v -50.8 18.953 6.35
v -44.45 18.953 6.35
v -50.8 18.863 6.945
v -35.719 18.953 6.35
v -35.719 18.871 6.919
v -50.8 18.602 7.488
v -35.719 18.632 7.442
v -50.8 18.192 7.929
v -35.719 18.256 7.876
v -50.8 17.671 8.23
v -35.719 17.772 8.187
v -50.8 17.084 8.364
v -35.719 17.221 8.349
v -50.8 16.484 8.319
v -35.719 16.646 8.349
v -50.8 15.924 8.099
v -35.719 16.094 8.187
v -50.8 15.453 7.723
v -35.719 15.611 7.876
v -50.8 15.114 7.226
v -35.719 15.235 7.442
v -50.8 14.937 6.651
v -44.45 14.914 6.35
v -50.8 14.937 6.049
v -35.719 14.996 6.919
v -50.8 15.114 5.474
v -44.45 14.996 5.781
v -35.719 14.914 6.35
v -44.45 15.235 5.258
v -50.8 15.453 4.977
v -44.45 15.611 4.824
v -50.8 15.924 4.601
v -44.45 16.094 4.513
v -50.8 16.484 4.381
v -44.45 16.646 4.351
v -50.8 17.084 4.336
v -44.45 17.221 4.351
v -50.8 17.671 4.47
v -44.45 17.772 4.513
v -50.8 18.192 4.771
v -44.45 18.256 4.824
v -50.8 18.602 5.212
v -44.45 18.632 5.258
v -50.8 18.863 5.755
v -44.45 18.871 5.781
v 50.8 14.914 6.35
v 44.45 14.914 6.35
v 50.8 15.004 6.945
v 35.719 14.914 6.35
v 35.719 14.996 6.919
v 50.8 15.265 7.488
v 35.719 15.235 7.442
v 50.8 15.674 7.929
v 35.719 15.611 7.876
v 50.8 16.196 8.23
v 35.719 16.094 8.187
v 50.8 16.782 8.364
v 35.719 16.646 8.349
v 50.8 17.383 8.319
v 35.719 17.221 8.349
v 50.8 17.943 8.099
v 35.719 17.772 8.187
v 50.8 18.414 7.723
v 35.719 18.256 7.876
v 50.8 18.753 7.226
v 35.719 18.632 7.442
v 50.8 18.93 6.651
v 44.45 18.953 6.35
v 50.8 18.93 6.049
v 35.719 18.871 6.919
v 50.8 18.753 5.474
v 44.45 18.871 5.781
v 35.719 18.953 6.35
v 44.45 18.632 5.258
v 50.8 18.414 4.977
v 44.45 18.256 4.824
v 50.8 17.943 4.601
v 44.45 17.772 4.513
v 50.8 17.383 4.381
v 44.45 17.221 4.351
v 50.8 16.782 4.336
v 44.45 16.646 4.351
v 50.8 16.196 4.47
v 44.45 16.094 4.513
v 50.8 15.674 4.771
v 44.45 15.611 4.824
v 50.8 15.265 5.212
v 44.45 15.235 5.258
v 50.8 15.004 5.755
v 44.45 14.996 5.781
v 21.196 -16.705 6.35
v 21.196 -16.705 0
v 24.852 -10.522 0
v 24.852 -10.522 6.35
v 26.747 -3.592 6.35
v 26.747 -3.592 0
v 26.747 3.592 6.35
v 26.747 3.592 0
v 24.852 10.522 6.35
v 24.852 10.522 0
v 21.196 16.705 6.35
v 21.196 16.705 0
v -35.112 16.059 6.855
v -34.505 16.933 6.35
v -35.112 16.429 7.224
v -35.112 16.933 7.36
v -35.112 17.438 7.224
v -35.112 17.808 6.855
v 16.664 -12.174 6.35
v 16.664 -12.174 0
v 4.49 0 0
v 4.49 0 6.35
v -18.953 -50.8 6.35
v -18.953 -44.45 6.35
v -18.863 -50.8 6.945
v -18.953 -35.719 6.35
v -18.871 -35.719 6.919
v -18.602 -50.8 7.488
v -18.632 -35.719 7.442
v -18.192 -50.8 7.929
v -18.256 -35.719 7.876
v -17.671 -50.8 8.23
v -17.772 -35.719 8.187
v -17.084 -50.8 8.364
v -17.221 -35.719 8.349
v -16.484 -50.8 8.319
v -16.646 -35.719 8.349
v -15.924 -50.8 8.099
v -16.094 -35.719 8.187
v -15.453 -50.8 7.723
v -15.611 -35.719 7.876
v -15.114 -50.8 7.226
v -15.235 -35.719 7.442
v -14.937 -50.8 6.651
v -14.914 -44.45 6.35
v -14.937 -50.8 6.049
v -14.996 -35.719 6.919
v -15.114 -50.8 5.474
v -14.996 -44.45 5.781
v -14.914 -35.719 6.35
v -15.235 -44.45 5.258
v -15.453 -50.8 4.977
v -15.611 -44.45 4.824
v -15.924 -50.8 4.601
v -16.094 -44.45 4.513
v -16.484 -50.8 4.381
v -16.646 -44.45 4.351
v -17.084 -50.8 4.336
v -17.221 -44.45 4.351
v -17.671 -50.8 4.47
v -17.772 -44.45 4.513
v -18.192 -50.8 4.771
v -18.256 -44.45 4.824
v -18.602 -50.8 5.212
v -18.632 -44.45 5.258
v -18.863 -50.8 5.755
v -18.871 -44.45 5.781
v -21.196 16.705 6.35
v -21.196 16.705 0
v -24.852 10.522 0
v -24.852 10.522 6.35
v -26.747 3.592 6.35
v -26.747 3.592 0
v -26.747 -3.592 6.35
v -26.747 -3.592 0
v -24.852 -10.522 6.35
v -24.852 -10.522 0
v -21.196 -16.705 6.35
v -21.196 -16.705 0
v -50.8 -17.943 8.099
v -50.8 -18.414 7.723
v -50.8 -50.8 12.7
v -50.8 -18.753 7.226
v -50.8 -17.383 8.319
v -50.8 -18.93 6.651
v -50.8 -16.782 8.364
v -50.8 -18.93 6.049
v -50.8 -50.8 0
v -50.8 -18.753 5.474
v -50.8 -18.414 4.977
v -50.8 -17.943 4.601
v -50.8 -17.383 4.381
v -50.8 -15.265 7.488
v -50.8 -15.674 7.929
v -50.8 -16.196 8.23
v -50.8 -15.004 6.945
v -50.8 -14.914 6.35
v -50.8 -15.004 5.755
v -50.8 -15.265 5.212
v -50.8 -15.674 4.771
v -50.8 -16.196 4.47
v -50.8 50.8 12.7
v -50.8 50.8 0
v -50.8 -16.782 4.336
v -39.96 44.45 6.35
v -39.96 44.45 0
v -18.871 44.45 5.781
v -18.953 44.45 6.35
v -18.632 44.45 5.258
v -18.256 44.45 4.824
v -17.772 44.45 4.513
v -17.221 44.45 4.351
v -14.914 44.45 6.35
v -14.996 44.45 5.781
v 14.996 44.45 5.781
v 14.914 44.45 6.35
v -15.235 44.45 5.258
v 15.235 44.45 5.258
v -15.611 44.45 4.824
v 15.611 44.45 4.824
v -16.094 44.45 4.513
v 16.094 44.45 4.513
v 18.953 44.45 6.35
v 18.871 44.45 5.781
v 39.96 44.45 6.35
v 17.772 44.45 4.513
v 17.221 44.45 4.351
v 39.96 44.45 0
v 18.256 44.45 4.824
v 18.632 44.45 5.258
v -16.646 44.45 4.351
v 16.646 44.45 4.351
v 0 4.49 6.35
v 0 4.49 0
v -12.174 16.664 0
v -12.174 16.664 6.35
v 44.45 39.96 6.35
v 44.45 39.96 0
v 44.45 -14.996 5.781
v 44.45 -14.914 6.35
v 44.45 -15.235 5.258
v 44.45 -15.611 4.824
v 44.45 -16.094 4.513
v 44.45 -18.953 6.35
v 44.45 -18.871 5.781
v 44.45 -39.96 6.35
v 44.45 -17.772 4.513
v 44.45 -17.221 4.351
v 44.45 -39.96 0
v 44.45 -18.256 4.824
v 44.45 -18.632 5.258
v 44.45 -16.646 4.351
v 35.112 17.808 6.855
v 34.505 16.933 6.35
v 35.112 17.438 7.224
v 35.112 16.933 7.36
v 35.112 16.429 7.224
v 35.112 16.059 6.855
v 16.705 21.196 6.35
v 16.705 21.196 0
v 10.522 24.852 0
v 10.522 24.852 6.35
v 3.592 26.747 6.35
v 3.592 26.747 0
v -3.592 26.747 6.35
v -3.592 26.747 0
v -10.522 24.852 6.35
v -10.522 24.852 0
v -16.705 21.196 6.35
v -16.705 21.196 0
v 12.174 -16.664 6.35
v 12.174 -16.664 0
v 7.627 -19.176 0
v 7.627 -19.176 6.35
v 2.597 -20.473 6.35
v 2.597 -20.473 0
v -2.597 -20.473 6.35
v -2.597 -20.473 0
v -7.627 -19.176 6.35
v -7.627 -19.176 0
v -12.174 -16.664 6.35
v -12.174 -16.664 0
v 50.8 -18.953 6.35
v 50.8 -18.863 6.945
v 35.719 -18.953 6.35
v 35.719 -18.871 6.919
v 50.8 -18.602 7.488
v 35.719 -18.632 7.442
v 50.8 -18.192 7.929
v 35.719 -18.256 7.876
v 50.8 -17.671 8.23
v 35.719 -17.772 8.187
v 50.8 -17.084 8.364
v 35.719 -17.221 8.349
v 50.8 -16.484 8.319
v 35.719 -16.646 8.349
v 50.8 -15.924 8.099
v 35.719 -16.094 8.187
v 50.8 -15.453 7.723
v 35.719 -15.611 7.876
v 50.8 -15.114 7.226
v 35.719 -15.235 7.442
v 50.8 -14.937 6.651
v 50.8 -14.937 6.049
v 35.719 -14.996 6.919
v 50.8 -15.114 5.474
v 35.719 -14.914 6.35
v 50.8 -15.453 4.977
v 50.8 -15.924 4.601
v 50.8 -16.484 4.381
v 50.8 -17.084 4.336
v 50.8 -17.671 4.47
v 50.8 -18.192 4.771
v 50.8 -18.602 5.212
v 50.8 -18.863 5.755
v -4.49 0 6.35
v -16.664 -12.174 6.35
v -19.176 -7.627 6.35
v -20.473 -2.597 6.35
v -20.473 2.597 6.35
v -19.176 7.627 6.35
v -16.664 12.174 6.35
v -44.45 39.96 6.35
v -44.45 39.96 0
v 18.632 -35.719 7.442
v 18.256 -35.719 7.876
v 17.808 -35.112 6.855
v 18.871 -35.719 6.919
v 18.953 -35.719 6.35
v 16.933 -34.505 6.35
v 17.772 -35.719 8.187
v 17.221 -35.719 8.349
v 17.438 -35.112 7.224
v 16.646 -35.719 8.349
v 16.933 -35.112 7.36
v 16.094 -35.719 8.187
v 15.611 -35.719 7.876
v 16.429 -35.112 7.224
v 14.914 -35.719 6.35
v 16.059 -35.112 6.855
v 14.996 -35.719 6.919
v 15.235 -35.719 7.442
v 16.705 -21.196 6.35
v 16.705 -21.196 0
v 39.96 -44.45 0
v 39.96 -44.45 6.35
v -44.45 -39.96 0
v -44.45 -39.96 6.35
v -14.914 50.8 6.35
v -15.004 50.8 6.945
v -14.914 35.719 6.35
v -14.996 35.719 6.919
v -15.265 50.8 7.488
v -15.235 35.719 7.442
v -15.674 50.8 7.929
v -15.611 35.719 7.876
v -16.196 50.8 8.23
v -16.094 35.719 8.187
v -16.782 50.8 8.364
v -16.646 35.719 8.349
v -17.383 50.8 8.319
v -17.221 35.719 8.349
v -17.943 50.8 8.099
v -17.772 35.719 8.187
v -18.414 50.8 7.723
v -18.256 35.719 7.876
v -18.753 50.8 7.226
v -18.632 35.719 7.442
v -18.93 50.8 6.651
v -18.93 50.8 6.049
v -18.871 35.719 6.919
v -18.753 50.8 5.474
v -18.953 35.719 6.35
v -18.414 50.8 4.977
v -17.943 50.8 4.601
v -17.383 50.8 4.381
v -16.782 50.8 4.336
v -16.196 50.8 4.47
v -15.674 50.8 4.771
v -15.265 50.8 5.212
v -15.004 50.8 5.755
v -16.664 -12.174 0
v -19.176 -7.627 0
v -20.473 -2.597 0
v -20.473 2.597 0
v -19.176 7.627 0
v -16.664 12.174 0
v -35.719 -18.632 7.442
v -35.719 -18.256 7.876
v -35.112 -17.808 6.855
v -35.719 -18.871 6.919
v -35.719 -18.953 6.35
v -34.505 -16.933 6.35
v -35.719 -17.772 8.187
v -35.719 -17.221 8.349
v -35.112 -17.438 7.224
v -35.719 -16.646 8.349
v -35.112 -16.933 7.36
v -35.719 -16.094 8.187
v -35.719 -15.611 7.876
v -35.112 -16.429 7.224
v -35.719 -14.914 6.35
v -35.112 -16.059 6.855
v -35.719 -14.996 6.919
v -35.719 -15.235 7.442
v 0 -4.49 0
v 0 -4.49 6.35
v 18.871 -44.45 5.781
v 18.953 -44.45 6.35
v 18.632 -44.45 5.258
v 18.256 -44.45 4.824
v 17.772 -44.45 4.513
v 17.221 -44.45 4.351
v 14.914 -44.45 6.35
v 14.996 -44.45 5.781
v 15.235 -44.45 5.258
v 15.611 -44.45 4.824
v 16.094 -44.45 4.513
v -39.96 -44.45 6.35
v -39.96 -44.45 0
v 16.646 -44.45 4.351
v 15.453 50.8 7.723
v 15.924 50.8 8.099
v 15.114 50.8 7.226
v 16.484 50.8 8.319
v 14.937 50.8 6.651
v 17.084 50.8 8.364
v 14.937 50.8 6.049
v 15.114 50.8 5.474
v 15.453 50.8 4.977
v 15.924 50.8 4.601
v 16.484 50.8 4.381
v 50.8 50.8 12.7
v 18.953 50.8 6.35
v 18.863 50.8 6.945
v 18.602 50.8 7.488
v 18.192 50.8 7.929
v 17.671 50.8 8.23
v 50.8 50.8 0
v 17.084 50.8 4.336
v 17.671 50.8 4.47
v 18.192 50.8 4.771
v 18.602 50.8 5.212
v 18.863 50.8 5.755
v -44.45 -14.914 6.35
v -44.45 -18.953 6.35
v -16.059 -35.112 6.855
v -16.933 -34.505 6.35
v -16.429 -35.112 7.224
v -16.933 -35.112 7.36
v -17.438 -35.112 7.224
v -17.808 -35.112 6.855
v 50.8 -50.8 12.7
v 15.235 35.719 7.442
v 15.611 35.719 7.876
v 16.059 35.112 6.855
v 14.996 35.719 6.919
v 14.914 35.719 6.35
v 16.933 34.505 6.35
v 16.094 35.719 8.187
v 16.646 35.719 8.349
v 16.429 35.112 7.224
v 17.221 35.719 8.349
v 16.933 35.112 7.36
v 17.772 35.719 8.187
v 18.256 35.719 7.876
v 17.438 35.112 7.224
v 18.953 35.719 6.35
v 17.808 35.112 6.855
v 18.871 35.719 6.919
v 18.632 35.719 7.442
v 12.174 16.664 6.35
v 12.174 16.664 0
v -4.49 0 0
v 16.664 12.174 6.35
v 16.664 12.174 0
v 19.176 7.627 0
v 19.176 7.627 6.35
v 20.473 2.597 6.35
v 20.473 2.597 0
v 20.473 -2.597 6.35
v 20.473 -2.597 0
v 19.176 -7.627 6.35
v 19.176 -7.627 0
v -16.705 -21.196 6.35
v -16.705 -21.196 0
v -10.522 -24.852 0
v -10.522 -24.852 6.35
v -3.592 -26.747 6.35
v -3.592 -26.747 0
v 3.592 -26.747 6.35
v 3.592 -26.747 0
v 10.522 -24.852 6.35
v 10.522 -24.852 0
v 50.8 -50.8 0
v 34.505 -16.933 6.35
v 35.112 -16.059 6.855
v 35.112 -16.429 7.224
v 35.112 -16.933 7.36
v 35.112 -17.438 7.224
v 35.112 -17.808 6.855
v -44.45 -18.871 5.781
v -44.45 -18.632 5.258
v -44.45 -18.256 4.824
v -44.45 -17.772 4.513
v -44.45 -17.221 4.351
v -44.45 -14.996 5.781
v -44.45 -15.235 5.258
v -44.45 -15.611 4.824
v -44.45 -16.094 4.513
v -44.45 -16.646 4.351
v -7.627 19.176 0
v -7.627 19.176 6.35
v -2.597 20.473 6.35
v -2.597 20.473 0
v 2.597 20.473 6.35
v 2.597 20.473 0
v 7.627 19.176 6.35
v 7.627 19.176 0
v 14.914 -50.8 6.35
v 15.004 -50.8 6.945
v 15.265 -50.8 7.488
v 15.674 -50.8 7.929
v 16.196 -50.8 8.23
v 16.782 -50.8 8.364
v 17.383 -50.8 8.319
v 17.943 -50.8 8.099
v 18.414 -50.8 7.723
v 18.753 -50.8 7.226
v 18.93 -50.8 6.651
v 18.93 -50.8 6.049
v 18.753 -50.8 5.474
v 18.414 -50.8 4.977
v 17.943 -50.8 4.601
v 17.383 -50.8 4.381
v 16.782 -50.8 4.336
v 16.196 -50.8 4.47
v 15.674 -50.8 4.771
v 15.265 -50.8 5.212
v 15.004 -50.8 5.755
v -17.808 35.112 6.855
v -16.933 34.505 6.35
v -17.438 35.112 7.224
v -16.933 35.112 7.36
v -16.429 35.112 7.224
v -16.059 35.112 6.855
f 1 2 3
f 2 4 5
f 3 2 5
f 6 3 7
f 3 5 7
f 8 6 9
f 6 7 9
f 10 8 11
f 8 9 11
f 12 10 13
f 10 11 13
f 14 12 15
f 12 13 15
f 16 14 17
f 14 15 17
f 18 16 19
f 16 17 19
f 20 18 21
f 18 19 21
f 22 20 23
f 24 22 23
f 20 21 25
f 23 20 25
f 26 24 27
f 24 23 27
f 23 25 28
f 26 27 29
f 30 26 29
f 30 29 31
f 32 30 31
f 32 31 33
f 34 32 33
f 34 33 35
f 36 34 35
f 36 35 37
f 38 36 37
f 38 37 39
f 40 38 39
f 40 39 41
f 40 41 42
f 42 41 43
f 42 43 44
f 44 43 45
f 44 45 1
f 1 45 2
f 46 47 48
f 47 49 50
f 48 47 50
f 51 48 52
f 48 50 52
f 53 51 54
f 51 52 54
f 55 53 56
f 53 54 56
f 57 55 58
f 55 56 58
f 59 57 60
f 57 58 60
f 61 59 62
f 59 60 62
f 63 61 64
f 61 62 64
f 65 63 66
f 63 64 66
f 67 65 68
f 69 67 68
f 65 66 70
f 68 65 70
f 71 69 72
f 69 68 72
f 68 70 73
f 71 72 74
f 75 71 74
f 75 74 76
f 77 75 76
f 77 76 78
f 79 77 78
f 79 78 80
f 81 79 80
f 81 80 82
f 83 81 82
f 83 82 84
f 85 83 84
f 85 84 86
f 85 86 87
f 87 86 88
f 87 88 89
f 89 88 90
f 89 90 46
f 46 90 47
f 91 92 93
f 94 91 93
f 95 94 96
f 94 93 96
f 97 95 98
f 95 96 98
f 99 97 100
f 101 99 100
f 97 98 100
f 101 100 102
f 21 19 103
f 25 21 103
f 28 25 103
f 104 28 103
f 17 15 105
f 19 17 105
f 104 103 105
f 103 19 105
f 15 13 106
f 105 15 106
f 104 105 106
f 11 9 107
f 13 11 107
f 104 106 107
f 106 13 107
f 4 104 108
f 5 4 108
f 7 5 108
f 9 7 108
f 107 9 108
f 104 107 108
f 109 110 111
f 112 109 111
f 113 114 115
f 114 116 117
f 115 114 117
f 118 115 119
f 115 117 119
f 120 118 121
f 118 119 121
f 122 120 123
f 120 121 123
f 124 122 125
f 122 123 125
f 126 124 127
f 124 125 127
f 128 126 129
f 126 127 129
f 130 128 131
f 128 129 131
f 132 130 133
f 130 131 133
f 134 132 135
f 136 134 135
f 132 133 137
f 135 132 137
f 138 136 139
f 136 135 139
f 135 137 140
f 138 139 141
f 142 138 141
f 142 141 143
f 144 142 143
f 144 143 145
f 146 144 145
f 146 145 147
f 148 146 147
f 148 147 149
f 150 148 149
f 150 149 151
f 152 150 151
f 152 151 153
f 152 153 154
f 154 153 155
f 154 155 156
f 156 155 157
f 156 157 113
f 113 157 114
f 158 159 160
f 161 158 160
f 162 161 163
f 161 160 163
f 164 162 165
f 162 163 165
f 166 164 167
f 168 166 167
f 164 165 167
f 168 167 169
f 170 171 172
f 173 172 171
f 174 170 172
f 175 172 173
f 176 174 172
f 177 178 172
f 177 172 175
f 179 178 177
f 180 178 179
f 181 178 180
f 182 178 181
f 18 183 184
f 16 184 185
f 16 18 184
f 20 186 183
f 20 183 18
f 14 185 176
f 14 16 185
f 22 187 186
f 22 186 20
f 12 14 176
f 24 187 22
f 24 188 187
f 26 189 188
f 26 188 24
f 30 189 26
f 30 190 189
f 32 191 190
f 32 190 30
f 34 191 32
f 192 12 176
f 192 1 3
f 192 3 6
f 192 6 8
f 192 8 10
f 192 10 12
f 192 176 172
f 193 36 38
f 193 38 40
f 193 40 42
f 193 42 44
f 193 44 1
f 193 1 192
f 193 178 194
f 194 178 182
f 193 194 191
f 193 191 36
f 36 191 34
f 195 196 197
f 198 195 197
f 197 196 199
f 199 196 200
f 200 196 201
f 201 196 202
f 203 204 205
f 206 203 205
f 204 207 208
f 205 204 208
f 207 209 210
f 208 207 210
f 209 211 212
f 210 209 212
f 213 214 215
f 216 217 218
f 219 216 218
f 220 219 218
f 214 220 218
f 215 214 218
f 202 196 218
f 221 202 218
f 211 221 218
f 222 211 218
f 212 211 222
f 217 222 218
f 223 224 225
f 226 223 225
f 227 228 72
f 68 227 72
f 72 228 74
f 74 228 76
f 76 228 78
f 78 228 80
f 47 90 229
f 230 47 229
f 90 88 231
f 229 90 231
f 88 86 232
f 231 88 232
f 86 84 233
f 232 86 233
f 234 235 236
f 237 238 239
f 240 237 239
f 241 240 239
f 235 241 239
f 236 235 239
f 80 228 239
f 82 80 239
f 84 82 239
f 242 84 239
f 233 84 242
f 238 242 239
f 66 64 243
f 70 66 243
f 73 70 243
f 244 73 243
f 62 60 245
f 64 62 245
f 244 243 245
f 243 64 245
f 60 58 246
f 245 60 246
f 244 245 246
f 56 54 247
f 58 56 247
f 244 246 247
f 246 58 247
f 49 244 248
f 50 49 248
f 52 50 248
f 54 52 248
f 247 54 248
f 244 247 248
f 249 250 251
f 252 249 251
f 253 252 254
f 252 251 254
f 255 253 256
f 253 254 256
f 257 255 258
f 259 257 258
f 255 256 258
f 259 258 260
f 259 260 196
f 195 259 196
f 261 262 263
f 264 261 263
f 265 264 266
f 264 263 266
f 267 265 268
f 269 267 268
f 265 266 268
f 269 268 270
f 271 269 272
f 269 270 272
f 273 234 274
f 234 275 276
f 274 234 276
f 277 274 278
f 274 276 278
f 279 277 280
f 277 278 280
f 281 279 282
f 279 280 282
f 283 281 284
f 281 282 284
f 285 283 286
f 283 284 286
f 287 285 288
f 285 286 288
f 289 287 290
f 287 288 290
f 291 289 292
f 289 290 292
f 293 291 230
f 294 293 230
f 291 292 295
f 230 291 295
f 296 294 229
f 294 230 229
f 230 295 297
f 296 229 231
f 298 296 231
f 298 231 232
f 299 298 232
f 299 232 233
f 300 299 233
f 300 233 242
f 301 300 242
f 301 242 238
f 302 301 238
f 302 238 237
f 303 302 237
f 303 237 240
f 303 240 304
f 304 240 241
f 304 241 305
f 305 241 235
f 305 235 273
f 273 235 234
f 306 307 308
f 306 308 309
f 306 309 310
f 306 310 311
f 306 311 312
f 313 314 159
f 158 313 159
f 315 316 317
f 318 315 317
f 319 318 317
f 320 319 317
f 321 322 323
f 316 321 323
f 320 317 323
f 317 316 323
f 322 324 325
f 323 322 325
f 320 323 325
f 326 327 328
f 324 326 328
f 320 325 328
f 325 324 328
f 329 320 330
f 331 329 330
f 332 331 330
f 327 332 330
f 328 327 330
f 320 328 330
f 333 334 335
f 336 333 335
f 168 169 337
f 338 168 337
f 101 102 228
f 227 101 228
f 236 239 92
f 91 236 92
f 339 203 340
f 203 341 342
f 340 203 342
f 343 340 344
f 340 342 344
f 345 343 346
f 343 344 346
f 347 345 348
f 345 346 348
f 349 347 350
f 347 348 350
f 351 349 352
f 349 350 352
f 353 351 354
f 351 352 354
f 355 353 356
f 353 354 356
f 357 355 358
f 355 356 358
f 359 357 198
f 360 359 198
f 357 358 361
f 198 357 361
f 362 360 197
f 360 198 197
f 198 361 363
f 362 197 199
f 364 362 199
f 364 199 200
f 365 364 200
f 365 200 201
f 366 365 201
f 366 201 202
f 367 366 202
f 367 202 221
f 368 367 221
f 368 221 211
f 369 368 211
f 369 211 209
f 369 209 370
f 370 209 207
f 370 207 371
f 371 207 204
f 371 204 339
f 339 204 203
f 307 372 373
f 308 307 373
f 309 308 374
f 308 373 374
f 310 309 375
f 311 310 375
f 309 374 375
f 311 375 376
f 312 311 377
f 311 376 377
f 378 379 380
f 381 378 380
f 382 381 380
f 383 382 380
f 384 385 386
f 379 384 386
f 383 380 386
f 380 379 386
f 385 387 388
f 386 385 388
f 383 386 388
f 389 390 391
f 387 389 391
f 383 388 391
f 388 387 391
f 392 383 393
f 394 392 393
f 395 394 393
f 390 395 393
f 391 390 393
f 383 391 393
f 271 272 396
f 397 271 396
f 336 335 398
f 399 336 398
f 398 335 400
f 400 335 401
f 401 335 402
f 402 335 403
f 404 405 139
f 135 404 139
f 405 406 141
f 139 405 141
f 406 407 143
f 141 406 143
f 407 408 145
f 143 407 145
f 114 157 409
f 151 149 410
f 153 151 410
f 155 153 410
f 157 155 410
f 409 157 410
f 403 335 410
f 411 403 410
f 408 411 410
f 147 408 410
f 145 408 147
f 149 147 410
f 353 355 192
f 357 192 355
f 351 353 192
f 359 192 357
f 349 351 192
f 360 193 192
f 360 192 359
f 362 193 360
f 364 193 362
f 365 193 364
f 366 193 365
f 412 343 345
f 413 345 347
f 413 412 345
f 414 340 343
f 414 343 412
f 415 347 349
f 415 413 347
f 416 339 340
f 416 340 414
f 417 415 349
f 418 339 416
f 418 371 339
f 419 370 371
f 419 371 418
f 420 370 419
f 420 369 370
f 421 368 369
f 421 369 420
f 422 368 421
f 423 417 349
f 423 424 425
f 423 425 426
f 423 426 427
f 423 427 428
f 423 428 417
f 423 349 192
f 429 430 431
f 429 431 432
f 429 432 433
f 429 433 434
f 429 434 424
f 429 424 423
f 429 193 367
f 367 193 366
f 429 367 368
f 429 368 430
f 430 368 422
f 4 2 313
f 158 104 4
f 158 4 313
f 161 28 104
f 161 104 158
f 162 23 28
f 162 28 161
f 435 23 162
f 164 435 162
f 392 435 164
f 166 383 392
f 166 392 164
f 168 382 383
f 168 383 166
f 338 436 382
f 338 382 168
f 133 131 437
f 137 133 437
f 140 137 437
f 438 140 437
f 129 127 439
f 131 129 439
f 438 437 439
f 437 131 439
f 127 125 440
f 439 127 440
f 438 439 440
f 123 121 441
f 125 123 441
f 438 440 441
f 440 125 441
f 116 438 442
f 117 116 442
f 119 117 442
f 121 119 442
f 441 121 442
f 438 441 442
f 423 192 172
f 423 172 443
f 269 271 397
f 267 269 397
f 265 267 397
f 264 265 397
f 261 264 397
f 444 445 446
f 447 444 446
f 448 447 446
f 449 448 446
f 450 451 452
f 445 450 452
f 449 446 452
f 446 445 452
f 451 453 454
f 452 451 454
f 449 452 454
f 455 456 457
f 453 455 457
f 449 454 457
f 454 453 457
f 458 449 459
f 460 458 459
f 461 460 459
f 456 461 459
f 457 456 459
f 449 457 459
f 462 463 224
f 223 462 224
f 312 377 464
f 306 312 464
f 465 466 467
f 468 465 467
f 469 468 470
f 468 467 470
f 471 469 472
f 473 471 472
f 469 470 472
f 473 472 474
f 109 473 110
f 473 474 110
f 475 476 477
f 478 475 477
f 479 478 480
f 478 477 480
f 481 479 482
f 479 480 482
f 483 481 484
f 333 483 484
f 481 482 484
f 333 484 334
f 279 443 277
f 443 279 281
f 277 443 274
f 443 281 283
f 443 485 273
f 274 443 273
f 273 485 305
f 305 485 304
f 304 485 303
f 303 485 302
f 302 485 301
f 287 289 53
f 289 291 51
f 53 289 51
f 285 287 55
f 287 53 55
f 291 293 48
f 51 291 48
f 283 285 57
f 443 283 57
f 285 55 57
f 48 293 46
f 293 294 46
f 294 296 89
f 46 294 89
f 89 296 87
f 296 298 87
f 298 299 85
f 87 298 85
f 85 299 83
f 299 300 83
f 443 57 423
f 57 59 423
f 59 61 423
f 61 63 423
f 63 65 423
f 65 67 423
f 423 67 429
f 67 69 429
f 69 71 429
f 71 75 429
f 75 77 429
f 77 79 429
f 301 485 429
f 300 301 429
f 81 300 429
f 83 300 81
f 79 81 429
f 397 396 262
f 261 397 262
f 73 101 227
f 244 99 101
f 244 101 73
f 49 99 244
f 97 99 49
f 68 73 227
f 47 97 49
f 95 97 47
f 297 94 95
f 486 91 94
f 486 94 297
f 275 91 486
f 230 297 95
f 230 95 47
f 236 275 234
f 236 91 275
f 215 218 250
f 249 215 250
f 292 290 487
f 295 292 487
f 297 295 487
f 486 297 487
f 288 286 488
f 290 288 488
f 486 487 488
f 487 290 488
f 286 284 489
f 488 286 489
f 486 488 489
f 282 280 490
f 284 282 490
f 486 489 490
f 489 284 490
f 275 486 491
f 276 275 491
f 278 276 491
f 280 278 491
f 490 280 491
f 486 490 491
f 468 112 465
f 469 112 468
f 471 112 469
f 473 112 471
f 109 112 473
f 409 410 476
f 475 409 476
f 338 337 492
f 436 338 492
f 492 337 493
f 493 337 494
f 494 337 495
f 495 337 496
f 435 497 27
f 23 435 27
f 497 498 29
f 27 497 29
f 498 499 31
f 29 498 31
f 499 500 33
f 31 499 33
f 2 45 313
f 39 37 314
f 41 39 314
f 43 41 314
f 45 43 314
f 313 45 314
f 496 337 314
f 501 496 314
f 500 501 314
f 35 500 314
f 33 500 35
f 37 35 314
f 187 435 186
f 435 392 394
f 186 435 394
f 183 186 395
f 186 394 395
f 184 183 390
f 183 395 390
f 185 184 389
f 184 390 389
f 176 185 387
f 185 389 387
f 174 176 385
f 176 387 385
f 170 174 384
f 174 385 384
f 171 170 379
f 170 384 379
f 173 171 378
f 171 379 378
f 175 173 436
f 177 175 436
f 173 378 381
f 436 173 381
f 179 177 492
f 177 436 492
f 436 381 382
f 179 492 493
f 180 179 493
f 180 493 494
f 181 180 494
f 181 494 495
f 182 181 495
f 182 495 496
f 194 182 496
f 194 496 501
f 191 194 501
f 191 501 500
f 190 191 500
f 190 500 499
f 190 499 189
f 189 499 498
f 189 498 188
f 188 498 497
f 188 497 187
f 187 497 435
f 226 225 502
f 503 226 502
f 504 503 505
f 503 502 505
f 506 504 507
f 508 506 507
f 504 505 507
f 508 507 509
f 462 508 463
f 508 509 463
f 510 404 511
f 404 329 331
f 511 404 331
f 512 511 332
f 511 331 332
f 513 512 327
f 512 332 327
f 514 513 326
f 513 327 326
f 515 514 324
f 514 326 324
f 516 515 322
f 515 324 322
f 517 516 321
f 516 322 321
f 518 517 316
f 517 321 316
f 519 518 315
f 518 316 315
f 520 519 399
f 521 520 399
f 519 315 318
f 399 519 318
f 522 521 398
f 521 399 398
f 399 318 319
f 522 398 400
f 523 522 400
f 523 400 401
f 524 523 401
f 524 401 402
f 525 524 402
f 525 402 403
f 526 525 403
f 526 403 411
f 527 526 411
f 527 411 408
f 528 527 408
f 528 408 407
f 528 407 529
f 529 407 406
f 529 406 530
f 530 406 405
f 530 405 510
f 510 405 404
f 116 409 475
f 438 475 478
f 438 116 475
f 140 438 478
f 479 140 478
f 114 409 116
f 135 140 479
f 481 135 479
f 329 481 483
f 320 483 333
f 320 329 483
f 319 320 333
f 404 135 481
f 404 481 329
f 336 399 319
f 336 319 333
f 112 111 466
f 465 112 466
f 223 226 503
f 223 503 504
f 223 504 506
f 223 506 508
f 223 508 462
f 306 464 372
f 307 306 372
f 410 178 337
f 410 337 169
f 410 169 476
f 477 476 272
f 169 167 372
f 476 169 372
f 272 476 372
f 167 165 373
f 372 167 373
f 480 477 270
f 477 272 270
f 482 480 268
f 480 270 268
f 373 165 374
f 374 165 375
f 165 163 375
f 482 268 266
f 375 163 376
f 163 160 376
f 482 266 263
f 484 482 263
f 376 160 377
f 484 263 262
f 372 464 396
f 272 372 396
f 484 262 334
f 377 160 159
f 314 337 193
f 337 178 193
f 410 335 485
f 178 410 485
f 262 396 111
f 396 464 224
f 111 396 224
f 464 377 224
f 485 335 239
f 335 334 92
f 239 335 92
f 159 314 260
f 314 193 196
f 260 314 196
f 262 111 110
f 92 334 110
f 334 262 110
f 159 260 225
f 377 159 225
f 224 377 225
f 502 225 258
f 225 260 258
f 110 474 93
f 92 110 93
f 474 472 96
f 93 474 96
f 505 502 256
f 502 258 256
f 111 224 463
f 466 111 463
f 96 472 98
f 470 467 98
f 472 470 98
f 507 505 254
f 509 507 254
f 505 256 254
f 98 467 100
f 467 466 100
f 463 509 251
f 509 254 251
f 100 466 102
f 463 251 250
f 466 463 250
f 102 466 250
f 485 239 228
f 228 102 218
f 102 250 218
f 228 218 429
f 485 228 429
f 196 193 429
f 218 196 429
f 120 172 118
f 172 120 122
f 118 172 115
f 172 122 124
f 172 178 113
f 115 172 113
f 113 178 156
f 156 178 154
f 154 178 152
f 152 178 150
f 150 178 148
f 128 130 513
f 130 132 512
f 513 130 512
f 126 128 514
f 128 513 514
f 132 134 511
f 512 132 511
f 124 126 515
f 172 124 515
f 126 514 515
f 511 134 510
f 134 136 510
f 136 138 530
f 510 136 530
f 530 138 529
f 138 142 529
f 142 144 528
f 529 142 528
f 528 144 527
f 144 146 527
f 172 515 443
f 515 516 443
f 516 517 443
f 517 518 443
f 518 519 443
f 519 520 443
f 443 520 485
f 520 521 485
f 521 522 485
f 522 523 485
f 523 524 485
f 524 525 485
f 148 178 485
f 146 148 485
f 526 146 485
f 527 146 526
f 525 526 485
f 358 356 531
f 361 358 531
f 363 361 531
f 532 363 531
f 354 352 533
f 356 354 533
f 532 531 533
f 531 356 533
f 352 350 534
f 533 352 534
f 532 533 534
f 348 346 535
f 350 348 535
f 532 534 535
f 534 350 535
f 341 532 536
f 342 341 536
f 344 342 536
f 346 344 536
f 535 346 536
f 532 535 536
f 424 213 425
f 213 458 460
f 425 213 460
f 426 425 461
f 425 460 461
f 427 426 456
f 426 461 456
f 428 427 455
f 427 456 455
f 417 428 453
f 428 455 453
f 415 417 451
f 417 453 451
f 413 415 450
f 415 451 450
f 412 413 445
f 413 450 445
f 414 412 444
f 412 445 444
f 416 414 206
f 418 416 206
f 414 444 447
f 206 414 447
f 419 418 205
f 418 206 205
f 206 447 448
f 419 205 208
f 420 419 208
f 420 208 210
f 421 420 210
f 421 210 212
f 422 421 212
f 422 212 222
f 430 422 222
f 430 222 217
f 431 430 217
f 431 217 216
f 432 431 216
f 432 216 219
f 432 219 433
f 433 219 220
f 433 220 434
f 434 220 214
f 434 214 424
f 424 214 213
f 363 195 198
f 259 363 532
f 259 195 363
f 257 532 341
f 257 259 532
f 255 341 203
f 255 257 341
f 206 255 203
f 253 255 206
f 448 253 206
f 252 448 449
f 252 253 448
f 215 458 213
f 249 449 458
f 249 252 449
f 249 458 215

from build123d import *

# Parameters (mm, degrees)
F0_W           = 101.6
F0_H           = 101.6
F1_DEPTH       = 12.7
F3_DEPTH       = 6.35
F8_D           = 4.0386
F8_DEPTH       = 15.08125
F8_TIP         = 1.213317848
F8_ON_F7_D     = 4.0386
F8_ON_F7_DEPTH = 15.08125
F8_ON_F7_TIP   = 1.213317848
F8_ON_F6_D     = 4.0386
F8_ON_F6_DEPTH = 15.08125
F8_ON_F6_TIP   = 1.213317848
F8_ON_F5_D     = 4.0386
F8_ON_F5_DEPTH = 15.08125
F8_ON_F5_TIP   = 1.213317848


with BuildPart() as f1:
    # F0 (on Top) → F1 (new body)
    with BuildSketch(Plane.XY):
        Rectangle(F0_W, F0_H)
    extrude(amount=F1_DEPTH)

    # F2 (on face) → F3 (cut)
    with BuildSketch(Plane(origin=(0, 0, 0), x_dir=(1, 0, 0), z_dir=(0, 0, -1))):
        with BuildLine():
            Line((-12.1741207811, 16.6642488417), (0, 4.4901280605))
            Line((0, 4.4901280605), (12.1741207811, 16.6642488417))
            ThreePointArc((12.1741207811, 16.6642488417), (0, 20.6375), (-12.1741207811, 16.6642488417))
        make_face()
        with BuildLine():
            Line((39.9598719395, 44.45), (-39.9598719395, 44.45))
            Line((-39.9598719395, 44.45), (-16.705457483, 21.1955855435))
            ThreePointArc((-16.705457483, 21.1955855435), (0, 26.9875), (16.705457483, 21.1955855435))
            Line((16.705457483, 21.1955855435), (39.9598719395, 44.45))
        make_face()
        with BuildLine():
            Line((-44.45, 39.9598719395), (-44.45, -39.9598719395))
            Line((-44.45, -39.9598719395), (-21.1955855435, -16.705457483))
            ThreePointArc((-21.1955855435, -16.705457483), (-26.9875, 0), (-21.1955855435, 16.705457483))
            Line((-21.1955855435, 16.705457483), (-44.45, 39.9598719395))
        make_face()
        with BuildLine():
            Line((-16.6642488417, -12.1741207811), (-4.4901280605, 0))
            Line((-4.4901280605, 0), (-16.6642488417, 12.1741207811))
            ThreePointArc((-16.6642488417, 12.1741207811), (-20.6375, 0), (-16.6642488417, -12.1741207811))
        make_face()
        with BuildLine():
            Line((-39.9598719395, -44.45), (39.9598719395, -44.45))
            Line((39.9598719395, -44.45), (16.705457483, -21.1955855435))
            ThreePointArc((16.705457483, -21.1955855435), (0, -26.9875), (-16.705457483, -21.1955855435))
            Line((-16.705457483, -21.1955855435), (-39.9598719395, -44.45))
        make_face()
        with BuildLine():
            Line((12.1741207811, -16.6642488417), (0, -4.4901280605))
            Line((0, -4.4901280605), (-12.1741207811, -16.6642488417))
            ThreePointArc((-12.1741207811, -16.6642488417), (0, -20.6375), (12.1741207811, -16.6642488417))
        make_face()
        with BuildLine():
            Line((44.45, -39.9598719395), (44.45, 39.9598719395))
            Line((44.45, 39.9598719395), (21.1955855435, 16.705457483))
            ThreePointArc((21.1955855435, 16.705457483), (26.9875, 0), (21.1955855435, -16.705457483))
            Line((21.1955855435, -16.705457483), (44.45, -39.9598719395))
        make_face()
        with BuildLine():
            Line((16.6642488417, 12.1741207811), (4.4901280605, 0))
            Line((4.4901280605, 0), (16.6642488417, -12.1741207811))
            ThreePointArc((16.6642488417, -12.1741207811), (20.6375, 0), (16.6642488417, 12.1741207811))
        make_face()
    extrude(amount=-F3_DEPTH, mode=Mode.SUBTRACT)

    # F8
    with Locations(Plane.XZ.offset(50.8)):
        with Locations((-16.9333333333, 6.35), (16.9333333333, 6.35)):
            Hole(F8_D / 2, depth=F8_DEPTH)
            with Locations((0, 0, -(F8_DEPTH + F8_TIP / 2))):  # 118° drill point
                Cone(0, F8_D / 2, F8_TIP, mode=Mode.SUBTRACT)

    # F8 on F7
    with Locations(Plane(origin=(-50.8, 0, 0), x_dir=(0, -1, 0), z_dir=(-1, 0, 0))):
        with Locations((16.9333333333, 6.35), (-16.9333333333, 6.35)):
            Hole(F8_ON_F7_D / 2, depth=F8_ON_F7_DEPTH)
            with Locations((0, 0, -(F8_ON_F7_DEPTH + F8_ON_F7_TIP / 2))):  # 118° drill point
                Cone(0, F8_ON_F7_D / 2, F8_ON_F7_TIP, mode=Mode.SUBTRACT)

    # F8 on F6
    with Locations(Plane(origin=(0, 50.8, 0), x_dir=(-1, 0, 0), z_dir=(0, 1, 0))):
        with Locations((16.9333333333, 6.35), (-16.9333333333, 6.35)):
            Hole(F8_ON_F6_D / 2, depth=F8_ON_F6_DEPTH)
            with Locations((0, 0, -(F8_ON_F6_DEPTH + F8_ON_F6_TIP / 2))):  # 118° drill point
                Cone(0, F8_ON_F6_D / 2, F8_ON_F6_TIP, mode=Mode.SUBTRACT)

    # F8 on F5
    with Locations(Plane.YZ.offset(50.8)):
        with Locations((16.9333333333, 6.35), (-16.9333333333, 6.35)):
            Hole(F8_ON_F5_D / 2, depth=F8_ON_F5_DEPTH)
            with Locations((0, 0, -(F8_ON_F5_DEPTH + F8_ON_F5_TIP / 2))):  # 118° drill point
                Cone(0, F8_ON_F5_D / 2, F8_ON_F5_TIP, mode=Mode.SUBTRACT)


solid = f1.part
